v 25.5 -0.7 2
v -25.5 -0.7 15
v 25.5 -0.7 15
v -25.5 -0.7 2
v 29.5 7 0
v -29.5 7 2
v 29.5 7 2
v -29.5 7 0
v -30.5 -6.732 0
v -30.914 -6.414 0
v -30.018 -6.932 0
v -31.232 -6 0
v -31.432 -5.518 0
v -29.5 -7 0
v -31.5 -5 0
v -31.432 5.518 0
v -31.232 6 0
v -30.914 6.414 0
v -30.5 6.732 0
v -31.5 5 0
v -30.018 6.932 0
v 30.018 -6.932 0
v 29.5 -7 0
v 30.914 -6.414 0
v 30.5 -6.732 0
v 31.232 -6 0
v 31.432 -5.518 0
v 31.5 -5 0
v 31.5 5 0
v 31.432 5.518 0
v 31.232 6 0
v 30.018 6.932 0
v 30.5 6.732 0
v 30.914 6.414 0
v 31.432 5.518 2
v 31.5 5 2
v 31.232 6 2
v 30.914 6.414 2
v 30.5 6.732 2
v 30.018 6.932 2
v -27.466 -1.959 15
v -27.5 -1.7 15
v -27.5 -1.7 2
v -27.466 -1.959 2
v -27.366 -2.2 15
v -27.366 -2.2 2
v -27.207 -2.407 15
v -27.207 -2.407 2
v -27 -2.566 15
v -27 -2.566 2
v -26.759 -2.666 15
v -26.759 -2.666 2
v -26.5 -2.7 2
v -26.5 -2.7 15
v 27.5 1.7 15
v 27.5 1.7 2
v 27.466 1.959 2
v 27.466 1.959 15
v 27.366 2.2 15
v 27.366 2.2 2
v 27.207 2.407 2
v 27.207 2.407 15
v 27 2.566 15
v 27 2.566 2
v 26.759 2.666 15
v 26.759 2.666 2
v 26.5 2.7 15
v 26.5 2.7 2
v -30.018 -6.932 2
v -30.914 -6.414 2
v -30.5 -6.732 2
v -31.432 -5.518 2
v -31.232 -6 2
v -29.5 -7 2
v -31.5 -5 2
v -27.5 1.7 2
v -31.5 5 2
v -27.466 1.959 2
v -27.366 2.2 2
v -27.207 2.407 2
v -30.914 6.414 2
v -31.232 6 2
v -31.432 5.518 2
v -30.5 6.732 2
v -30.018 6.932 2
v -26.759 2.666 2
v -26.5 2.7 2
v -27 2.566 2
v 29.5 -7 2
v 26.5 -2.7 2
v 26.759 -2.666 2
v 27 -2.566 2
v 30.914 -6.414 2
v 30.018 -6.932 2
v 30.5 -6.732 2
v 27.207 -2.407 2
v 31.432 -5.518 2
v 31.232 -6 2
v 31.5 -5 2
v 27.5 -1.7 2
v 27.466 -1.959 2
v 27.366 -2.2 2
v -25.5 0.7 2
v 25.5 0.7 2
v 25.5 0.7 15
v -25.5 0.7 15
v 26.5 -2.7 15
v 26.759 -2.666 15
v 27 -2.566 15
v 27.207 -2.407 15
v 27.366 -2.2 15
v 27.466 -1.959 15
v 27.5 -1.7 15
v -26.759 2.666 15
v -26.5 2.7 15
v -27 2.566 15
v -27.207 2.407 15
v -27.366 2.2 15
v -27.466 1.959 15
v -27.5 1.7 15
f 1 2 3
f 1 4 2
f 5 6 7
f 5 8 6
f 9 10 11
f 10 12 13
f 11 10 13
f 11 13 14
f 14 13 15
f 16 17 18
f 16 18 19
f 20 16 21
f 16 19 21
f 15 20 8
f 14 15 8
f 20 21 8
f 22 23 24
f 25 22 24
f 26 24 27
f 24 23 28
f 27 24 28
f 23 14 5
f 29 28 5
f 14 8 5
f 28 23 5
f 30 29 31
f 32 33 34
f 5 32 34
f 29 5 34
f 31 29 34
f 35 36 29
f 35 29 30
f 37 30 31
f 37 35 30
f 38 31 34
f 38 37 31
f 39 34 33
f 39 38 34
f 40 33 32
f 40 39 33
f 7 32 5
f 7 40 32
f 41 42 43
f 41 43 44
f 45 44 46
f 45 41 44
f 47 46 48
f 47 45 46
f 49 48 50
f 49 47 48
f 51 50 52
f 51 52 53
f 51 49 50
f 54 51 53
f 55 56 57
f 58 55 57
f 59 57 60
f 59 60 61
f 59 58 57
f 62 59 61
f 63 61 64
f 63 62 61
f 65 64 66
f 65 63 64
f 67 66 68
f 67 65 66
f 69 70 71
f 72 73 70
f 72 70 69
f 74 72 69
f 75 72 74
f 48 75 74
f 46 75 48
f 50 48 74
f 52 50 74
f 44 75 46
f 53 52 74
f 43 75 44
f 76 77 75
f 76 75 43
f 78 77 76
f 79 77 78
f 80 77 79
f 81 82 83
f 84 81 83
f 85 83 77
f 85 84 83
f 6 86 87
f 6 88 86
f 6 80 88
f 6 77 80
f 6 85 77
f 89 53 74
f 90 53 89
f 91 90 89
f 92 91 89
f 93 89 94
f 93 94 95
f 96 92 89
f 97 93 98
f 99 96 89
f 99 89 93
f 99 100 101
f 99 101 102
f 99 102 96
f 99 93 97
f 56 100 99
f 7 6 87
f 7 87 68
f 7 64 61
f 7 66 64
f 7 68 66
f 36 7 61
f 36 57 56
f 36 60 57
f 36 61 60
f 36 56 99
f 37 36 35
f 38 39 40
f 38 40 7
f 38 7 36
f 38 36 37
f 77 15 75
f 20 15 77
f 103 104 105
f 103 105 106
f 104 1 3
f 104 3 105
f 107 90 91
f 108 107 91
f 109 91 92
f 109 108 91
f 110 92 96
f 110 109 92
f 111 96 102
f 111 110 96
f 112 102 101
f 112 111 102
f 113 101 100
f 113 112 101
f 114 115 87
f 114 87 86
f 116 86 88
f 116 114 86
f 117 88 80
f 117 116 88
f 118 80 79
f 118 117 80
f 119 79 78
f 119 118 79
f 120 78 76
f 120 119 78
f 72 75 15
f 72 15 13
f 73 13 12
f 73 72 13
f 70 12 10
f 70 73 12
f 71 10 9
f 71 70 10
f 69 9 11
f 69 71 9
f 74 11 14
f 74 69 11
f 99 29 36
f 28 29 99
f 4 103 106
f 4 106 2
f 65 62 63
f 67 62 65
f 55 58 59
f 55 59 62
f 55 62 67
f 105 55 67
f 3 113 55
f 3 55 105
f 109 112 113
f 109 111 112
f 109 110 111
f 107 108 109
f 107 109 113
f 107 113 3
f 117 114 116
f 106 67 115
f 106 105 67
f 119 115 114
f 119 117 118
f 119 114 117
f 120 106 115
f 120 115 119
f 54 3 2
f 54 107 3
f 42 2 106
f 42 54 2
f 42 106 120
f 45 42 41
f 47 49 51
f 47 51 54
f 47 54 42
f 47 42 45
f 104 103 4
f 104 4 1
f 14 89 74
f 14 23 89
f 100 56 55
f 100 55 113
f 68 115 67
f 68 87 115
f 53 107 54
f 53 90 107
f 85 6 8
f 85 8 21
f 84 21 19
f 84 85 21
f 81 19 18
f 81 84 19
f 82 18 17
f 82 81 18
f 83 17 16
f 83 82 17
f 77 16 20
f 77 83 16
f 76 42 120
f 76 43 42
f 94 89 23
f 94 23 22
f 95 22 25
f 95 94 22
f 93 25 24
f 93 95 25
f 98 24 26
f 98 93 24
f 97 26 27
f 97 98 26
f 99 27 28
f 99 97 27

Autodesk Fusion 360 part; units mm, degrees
sketch "Sketch1" plane through (0, 0, 0) normal (0, 0, 1) x (1, 0, 0)
  line L0 (31.5, -7) -> (-31.5, -7)
  line L1 (-31.5, -7) -> (-31.5, 7)
  line L2 (-31.5, 7) -> (31.5, 7)
  line L3 (31.5, 7) -> (31.5, -7)
  line L4 (31.5, -7) -> (-31.5, 7) construction
  line L5 (-31.5, -7) -> (31.5, 7) construction
  dimension "d1" = 63
  dimension "d2" = 14
extrude "Extrude1" add sketch "Sketch1" along normal blind 2 makes body 1
sketch "Sketch3" plane through (0, 0, 2) normal (0, 0, 1) x (-1, 0, 0)
  line L0 (-31.5, -7) -> (31.5, -7)
  line L1 (31.5, -7) -> (31.5, 7)
  line L2 (31.5, 7) -> (-31.5, 7)
  line L3 (-31.5, 7) -> (-31.5, -7)
  line L4 (25.5, 0.7) -> (-25.5, 0.7)
  line L5 (-25.5, 0.7) -> (-25.5, -0.7)
  line L6 (-25.5, -0.7) -> (25.5, -0.7)
  line L7 (25.5, -0.7) -> (25.5, 0.7)
  line L8 (25.5, 0.7) -> (-25.5, -0.7) construction
  line L9 (-25.5, 0.7) -> (25.5, -0.7) construction
  line L10 (-27.5, 2.7) -> (27.5, 2.7)
  line L11 (27.5, 2.7) -> (27.5, -2.7)
  line L12 (27.5, -2.7) -> (-27.5, -2.7)
  line L13 (-27.5, -2.7) -> (-27.5, 2.7)
  line L14 (-27.5, 2.7) -> (27.5, -2.7) construction
  line L15 (27.5, 2.7) -> (-27.5, -2.7) construction
  dimension "d7" = 51
  dimension "d8" = 1.4
  dimension "d9" = 55
  dimension "d10" = 5.4
extrude "Extrude2" add sketch "Sketch3" along normal blind 13 contours L10 L11 L12 L13 bodies 1
fillet "Fillet1" radius 1 4 edges at (-27.5, -2.7, 8.5) (27.5, -2.7, 8.5) (-27.5, 2.7, 8.5) (27.5, 2.7, 8.5) on bodies 1
fillet "Fillet2" radius 2 4 edges at (-31.5, 7, 1) (31.5, 7, 1) (31.5, -7, 1) (-31.5, -7, 1) on bodies 1
copy_body "Body->Comp1" bodies 1 removing the originals makes body 2 in component "Grating_Holder"
component "Grating_Holder" placed x (1, 0, 0) y (0, 1, 0) z (0, 0, 1) at (0, 0, 0)
